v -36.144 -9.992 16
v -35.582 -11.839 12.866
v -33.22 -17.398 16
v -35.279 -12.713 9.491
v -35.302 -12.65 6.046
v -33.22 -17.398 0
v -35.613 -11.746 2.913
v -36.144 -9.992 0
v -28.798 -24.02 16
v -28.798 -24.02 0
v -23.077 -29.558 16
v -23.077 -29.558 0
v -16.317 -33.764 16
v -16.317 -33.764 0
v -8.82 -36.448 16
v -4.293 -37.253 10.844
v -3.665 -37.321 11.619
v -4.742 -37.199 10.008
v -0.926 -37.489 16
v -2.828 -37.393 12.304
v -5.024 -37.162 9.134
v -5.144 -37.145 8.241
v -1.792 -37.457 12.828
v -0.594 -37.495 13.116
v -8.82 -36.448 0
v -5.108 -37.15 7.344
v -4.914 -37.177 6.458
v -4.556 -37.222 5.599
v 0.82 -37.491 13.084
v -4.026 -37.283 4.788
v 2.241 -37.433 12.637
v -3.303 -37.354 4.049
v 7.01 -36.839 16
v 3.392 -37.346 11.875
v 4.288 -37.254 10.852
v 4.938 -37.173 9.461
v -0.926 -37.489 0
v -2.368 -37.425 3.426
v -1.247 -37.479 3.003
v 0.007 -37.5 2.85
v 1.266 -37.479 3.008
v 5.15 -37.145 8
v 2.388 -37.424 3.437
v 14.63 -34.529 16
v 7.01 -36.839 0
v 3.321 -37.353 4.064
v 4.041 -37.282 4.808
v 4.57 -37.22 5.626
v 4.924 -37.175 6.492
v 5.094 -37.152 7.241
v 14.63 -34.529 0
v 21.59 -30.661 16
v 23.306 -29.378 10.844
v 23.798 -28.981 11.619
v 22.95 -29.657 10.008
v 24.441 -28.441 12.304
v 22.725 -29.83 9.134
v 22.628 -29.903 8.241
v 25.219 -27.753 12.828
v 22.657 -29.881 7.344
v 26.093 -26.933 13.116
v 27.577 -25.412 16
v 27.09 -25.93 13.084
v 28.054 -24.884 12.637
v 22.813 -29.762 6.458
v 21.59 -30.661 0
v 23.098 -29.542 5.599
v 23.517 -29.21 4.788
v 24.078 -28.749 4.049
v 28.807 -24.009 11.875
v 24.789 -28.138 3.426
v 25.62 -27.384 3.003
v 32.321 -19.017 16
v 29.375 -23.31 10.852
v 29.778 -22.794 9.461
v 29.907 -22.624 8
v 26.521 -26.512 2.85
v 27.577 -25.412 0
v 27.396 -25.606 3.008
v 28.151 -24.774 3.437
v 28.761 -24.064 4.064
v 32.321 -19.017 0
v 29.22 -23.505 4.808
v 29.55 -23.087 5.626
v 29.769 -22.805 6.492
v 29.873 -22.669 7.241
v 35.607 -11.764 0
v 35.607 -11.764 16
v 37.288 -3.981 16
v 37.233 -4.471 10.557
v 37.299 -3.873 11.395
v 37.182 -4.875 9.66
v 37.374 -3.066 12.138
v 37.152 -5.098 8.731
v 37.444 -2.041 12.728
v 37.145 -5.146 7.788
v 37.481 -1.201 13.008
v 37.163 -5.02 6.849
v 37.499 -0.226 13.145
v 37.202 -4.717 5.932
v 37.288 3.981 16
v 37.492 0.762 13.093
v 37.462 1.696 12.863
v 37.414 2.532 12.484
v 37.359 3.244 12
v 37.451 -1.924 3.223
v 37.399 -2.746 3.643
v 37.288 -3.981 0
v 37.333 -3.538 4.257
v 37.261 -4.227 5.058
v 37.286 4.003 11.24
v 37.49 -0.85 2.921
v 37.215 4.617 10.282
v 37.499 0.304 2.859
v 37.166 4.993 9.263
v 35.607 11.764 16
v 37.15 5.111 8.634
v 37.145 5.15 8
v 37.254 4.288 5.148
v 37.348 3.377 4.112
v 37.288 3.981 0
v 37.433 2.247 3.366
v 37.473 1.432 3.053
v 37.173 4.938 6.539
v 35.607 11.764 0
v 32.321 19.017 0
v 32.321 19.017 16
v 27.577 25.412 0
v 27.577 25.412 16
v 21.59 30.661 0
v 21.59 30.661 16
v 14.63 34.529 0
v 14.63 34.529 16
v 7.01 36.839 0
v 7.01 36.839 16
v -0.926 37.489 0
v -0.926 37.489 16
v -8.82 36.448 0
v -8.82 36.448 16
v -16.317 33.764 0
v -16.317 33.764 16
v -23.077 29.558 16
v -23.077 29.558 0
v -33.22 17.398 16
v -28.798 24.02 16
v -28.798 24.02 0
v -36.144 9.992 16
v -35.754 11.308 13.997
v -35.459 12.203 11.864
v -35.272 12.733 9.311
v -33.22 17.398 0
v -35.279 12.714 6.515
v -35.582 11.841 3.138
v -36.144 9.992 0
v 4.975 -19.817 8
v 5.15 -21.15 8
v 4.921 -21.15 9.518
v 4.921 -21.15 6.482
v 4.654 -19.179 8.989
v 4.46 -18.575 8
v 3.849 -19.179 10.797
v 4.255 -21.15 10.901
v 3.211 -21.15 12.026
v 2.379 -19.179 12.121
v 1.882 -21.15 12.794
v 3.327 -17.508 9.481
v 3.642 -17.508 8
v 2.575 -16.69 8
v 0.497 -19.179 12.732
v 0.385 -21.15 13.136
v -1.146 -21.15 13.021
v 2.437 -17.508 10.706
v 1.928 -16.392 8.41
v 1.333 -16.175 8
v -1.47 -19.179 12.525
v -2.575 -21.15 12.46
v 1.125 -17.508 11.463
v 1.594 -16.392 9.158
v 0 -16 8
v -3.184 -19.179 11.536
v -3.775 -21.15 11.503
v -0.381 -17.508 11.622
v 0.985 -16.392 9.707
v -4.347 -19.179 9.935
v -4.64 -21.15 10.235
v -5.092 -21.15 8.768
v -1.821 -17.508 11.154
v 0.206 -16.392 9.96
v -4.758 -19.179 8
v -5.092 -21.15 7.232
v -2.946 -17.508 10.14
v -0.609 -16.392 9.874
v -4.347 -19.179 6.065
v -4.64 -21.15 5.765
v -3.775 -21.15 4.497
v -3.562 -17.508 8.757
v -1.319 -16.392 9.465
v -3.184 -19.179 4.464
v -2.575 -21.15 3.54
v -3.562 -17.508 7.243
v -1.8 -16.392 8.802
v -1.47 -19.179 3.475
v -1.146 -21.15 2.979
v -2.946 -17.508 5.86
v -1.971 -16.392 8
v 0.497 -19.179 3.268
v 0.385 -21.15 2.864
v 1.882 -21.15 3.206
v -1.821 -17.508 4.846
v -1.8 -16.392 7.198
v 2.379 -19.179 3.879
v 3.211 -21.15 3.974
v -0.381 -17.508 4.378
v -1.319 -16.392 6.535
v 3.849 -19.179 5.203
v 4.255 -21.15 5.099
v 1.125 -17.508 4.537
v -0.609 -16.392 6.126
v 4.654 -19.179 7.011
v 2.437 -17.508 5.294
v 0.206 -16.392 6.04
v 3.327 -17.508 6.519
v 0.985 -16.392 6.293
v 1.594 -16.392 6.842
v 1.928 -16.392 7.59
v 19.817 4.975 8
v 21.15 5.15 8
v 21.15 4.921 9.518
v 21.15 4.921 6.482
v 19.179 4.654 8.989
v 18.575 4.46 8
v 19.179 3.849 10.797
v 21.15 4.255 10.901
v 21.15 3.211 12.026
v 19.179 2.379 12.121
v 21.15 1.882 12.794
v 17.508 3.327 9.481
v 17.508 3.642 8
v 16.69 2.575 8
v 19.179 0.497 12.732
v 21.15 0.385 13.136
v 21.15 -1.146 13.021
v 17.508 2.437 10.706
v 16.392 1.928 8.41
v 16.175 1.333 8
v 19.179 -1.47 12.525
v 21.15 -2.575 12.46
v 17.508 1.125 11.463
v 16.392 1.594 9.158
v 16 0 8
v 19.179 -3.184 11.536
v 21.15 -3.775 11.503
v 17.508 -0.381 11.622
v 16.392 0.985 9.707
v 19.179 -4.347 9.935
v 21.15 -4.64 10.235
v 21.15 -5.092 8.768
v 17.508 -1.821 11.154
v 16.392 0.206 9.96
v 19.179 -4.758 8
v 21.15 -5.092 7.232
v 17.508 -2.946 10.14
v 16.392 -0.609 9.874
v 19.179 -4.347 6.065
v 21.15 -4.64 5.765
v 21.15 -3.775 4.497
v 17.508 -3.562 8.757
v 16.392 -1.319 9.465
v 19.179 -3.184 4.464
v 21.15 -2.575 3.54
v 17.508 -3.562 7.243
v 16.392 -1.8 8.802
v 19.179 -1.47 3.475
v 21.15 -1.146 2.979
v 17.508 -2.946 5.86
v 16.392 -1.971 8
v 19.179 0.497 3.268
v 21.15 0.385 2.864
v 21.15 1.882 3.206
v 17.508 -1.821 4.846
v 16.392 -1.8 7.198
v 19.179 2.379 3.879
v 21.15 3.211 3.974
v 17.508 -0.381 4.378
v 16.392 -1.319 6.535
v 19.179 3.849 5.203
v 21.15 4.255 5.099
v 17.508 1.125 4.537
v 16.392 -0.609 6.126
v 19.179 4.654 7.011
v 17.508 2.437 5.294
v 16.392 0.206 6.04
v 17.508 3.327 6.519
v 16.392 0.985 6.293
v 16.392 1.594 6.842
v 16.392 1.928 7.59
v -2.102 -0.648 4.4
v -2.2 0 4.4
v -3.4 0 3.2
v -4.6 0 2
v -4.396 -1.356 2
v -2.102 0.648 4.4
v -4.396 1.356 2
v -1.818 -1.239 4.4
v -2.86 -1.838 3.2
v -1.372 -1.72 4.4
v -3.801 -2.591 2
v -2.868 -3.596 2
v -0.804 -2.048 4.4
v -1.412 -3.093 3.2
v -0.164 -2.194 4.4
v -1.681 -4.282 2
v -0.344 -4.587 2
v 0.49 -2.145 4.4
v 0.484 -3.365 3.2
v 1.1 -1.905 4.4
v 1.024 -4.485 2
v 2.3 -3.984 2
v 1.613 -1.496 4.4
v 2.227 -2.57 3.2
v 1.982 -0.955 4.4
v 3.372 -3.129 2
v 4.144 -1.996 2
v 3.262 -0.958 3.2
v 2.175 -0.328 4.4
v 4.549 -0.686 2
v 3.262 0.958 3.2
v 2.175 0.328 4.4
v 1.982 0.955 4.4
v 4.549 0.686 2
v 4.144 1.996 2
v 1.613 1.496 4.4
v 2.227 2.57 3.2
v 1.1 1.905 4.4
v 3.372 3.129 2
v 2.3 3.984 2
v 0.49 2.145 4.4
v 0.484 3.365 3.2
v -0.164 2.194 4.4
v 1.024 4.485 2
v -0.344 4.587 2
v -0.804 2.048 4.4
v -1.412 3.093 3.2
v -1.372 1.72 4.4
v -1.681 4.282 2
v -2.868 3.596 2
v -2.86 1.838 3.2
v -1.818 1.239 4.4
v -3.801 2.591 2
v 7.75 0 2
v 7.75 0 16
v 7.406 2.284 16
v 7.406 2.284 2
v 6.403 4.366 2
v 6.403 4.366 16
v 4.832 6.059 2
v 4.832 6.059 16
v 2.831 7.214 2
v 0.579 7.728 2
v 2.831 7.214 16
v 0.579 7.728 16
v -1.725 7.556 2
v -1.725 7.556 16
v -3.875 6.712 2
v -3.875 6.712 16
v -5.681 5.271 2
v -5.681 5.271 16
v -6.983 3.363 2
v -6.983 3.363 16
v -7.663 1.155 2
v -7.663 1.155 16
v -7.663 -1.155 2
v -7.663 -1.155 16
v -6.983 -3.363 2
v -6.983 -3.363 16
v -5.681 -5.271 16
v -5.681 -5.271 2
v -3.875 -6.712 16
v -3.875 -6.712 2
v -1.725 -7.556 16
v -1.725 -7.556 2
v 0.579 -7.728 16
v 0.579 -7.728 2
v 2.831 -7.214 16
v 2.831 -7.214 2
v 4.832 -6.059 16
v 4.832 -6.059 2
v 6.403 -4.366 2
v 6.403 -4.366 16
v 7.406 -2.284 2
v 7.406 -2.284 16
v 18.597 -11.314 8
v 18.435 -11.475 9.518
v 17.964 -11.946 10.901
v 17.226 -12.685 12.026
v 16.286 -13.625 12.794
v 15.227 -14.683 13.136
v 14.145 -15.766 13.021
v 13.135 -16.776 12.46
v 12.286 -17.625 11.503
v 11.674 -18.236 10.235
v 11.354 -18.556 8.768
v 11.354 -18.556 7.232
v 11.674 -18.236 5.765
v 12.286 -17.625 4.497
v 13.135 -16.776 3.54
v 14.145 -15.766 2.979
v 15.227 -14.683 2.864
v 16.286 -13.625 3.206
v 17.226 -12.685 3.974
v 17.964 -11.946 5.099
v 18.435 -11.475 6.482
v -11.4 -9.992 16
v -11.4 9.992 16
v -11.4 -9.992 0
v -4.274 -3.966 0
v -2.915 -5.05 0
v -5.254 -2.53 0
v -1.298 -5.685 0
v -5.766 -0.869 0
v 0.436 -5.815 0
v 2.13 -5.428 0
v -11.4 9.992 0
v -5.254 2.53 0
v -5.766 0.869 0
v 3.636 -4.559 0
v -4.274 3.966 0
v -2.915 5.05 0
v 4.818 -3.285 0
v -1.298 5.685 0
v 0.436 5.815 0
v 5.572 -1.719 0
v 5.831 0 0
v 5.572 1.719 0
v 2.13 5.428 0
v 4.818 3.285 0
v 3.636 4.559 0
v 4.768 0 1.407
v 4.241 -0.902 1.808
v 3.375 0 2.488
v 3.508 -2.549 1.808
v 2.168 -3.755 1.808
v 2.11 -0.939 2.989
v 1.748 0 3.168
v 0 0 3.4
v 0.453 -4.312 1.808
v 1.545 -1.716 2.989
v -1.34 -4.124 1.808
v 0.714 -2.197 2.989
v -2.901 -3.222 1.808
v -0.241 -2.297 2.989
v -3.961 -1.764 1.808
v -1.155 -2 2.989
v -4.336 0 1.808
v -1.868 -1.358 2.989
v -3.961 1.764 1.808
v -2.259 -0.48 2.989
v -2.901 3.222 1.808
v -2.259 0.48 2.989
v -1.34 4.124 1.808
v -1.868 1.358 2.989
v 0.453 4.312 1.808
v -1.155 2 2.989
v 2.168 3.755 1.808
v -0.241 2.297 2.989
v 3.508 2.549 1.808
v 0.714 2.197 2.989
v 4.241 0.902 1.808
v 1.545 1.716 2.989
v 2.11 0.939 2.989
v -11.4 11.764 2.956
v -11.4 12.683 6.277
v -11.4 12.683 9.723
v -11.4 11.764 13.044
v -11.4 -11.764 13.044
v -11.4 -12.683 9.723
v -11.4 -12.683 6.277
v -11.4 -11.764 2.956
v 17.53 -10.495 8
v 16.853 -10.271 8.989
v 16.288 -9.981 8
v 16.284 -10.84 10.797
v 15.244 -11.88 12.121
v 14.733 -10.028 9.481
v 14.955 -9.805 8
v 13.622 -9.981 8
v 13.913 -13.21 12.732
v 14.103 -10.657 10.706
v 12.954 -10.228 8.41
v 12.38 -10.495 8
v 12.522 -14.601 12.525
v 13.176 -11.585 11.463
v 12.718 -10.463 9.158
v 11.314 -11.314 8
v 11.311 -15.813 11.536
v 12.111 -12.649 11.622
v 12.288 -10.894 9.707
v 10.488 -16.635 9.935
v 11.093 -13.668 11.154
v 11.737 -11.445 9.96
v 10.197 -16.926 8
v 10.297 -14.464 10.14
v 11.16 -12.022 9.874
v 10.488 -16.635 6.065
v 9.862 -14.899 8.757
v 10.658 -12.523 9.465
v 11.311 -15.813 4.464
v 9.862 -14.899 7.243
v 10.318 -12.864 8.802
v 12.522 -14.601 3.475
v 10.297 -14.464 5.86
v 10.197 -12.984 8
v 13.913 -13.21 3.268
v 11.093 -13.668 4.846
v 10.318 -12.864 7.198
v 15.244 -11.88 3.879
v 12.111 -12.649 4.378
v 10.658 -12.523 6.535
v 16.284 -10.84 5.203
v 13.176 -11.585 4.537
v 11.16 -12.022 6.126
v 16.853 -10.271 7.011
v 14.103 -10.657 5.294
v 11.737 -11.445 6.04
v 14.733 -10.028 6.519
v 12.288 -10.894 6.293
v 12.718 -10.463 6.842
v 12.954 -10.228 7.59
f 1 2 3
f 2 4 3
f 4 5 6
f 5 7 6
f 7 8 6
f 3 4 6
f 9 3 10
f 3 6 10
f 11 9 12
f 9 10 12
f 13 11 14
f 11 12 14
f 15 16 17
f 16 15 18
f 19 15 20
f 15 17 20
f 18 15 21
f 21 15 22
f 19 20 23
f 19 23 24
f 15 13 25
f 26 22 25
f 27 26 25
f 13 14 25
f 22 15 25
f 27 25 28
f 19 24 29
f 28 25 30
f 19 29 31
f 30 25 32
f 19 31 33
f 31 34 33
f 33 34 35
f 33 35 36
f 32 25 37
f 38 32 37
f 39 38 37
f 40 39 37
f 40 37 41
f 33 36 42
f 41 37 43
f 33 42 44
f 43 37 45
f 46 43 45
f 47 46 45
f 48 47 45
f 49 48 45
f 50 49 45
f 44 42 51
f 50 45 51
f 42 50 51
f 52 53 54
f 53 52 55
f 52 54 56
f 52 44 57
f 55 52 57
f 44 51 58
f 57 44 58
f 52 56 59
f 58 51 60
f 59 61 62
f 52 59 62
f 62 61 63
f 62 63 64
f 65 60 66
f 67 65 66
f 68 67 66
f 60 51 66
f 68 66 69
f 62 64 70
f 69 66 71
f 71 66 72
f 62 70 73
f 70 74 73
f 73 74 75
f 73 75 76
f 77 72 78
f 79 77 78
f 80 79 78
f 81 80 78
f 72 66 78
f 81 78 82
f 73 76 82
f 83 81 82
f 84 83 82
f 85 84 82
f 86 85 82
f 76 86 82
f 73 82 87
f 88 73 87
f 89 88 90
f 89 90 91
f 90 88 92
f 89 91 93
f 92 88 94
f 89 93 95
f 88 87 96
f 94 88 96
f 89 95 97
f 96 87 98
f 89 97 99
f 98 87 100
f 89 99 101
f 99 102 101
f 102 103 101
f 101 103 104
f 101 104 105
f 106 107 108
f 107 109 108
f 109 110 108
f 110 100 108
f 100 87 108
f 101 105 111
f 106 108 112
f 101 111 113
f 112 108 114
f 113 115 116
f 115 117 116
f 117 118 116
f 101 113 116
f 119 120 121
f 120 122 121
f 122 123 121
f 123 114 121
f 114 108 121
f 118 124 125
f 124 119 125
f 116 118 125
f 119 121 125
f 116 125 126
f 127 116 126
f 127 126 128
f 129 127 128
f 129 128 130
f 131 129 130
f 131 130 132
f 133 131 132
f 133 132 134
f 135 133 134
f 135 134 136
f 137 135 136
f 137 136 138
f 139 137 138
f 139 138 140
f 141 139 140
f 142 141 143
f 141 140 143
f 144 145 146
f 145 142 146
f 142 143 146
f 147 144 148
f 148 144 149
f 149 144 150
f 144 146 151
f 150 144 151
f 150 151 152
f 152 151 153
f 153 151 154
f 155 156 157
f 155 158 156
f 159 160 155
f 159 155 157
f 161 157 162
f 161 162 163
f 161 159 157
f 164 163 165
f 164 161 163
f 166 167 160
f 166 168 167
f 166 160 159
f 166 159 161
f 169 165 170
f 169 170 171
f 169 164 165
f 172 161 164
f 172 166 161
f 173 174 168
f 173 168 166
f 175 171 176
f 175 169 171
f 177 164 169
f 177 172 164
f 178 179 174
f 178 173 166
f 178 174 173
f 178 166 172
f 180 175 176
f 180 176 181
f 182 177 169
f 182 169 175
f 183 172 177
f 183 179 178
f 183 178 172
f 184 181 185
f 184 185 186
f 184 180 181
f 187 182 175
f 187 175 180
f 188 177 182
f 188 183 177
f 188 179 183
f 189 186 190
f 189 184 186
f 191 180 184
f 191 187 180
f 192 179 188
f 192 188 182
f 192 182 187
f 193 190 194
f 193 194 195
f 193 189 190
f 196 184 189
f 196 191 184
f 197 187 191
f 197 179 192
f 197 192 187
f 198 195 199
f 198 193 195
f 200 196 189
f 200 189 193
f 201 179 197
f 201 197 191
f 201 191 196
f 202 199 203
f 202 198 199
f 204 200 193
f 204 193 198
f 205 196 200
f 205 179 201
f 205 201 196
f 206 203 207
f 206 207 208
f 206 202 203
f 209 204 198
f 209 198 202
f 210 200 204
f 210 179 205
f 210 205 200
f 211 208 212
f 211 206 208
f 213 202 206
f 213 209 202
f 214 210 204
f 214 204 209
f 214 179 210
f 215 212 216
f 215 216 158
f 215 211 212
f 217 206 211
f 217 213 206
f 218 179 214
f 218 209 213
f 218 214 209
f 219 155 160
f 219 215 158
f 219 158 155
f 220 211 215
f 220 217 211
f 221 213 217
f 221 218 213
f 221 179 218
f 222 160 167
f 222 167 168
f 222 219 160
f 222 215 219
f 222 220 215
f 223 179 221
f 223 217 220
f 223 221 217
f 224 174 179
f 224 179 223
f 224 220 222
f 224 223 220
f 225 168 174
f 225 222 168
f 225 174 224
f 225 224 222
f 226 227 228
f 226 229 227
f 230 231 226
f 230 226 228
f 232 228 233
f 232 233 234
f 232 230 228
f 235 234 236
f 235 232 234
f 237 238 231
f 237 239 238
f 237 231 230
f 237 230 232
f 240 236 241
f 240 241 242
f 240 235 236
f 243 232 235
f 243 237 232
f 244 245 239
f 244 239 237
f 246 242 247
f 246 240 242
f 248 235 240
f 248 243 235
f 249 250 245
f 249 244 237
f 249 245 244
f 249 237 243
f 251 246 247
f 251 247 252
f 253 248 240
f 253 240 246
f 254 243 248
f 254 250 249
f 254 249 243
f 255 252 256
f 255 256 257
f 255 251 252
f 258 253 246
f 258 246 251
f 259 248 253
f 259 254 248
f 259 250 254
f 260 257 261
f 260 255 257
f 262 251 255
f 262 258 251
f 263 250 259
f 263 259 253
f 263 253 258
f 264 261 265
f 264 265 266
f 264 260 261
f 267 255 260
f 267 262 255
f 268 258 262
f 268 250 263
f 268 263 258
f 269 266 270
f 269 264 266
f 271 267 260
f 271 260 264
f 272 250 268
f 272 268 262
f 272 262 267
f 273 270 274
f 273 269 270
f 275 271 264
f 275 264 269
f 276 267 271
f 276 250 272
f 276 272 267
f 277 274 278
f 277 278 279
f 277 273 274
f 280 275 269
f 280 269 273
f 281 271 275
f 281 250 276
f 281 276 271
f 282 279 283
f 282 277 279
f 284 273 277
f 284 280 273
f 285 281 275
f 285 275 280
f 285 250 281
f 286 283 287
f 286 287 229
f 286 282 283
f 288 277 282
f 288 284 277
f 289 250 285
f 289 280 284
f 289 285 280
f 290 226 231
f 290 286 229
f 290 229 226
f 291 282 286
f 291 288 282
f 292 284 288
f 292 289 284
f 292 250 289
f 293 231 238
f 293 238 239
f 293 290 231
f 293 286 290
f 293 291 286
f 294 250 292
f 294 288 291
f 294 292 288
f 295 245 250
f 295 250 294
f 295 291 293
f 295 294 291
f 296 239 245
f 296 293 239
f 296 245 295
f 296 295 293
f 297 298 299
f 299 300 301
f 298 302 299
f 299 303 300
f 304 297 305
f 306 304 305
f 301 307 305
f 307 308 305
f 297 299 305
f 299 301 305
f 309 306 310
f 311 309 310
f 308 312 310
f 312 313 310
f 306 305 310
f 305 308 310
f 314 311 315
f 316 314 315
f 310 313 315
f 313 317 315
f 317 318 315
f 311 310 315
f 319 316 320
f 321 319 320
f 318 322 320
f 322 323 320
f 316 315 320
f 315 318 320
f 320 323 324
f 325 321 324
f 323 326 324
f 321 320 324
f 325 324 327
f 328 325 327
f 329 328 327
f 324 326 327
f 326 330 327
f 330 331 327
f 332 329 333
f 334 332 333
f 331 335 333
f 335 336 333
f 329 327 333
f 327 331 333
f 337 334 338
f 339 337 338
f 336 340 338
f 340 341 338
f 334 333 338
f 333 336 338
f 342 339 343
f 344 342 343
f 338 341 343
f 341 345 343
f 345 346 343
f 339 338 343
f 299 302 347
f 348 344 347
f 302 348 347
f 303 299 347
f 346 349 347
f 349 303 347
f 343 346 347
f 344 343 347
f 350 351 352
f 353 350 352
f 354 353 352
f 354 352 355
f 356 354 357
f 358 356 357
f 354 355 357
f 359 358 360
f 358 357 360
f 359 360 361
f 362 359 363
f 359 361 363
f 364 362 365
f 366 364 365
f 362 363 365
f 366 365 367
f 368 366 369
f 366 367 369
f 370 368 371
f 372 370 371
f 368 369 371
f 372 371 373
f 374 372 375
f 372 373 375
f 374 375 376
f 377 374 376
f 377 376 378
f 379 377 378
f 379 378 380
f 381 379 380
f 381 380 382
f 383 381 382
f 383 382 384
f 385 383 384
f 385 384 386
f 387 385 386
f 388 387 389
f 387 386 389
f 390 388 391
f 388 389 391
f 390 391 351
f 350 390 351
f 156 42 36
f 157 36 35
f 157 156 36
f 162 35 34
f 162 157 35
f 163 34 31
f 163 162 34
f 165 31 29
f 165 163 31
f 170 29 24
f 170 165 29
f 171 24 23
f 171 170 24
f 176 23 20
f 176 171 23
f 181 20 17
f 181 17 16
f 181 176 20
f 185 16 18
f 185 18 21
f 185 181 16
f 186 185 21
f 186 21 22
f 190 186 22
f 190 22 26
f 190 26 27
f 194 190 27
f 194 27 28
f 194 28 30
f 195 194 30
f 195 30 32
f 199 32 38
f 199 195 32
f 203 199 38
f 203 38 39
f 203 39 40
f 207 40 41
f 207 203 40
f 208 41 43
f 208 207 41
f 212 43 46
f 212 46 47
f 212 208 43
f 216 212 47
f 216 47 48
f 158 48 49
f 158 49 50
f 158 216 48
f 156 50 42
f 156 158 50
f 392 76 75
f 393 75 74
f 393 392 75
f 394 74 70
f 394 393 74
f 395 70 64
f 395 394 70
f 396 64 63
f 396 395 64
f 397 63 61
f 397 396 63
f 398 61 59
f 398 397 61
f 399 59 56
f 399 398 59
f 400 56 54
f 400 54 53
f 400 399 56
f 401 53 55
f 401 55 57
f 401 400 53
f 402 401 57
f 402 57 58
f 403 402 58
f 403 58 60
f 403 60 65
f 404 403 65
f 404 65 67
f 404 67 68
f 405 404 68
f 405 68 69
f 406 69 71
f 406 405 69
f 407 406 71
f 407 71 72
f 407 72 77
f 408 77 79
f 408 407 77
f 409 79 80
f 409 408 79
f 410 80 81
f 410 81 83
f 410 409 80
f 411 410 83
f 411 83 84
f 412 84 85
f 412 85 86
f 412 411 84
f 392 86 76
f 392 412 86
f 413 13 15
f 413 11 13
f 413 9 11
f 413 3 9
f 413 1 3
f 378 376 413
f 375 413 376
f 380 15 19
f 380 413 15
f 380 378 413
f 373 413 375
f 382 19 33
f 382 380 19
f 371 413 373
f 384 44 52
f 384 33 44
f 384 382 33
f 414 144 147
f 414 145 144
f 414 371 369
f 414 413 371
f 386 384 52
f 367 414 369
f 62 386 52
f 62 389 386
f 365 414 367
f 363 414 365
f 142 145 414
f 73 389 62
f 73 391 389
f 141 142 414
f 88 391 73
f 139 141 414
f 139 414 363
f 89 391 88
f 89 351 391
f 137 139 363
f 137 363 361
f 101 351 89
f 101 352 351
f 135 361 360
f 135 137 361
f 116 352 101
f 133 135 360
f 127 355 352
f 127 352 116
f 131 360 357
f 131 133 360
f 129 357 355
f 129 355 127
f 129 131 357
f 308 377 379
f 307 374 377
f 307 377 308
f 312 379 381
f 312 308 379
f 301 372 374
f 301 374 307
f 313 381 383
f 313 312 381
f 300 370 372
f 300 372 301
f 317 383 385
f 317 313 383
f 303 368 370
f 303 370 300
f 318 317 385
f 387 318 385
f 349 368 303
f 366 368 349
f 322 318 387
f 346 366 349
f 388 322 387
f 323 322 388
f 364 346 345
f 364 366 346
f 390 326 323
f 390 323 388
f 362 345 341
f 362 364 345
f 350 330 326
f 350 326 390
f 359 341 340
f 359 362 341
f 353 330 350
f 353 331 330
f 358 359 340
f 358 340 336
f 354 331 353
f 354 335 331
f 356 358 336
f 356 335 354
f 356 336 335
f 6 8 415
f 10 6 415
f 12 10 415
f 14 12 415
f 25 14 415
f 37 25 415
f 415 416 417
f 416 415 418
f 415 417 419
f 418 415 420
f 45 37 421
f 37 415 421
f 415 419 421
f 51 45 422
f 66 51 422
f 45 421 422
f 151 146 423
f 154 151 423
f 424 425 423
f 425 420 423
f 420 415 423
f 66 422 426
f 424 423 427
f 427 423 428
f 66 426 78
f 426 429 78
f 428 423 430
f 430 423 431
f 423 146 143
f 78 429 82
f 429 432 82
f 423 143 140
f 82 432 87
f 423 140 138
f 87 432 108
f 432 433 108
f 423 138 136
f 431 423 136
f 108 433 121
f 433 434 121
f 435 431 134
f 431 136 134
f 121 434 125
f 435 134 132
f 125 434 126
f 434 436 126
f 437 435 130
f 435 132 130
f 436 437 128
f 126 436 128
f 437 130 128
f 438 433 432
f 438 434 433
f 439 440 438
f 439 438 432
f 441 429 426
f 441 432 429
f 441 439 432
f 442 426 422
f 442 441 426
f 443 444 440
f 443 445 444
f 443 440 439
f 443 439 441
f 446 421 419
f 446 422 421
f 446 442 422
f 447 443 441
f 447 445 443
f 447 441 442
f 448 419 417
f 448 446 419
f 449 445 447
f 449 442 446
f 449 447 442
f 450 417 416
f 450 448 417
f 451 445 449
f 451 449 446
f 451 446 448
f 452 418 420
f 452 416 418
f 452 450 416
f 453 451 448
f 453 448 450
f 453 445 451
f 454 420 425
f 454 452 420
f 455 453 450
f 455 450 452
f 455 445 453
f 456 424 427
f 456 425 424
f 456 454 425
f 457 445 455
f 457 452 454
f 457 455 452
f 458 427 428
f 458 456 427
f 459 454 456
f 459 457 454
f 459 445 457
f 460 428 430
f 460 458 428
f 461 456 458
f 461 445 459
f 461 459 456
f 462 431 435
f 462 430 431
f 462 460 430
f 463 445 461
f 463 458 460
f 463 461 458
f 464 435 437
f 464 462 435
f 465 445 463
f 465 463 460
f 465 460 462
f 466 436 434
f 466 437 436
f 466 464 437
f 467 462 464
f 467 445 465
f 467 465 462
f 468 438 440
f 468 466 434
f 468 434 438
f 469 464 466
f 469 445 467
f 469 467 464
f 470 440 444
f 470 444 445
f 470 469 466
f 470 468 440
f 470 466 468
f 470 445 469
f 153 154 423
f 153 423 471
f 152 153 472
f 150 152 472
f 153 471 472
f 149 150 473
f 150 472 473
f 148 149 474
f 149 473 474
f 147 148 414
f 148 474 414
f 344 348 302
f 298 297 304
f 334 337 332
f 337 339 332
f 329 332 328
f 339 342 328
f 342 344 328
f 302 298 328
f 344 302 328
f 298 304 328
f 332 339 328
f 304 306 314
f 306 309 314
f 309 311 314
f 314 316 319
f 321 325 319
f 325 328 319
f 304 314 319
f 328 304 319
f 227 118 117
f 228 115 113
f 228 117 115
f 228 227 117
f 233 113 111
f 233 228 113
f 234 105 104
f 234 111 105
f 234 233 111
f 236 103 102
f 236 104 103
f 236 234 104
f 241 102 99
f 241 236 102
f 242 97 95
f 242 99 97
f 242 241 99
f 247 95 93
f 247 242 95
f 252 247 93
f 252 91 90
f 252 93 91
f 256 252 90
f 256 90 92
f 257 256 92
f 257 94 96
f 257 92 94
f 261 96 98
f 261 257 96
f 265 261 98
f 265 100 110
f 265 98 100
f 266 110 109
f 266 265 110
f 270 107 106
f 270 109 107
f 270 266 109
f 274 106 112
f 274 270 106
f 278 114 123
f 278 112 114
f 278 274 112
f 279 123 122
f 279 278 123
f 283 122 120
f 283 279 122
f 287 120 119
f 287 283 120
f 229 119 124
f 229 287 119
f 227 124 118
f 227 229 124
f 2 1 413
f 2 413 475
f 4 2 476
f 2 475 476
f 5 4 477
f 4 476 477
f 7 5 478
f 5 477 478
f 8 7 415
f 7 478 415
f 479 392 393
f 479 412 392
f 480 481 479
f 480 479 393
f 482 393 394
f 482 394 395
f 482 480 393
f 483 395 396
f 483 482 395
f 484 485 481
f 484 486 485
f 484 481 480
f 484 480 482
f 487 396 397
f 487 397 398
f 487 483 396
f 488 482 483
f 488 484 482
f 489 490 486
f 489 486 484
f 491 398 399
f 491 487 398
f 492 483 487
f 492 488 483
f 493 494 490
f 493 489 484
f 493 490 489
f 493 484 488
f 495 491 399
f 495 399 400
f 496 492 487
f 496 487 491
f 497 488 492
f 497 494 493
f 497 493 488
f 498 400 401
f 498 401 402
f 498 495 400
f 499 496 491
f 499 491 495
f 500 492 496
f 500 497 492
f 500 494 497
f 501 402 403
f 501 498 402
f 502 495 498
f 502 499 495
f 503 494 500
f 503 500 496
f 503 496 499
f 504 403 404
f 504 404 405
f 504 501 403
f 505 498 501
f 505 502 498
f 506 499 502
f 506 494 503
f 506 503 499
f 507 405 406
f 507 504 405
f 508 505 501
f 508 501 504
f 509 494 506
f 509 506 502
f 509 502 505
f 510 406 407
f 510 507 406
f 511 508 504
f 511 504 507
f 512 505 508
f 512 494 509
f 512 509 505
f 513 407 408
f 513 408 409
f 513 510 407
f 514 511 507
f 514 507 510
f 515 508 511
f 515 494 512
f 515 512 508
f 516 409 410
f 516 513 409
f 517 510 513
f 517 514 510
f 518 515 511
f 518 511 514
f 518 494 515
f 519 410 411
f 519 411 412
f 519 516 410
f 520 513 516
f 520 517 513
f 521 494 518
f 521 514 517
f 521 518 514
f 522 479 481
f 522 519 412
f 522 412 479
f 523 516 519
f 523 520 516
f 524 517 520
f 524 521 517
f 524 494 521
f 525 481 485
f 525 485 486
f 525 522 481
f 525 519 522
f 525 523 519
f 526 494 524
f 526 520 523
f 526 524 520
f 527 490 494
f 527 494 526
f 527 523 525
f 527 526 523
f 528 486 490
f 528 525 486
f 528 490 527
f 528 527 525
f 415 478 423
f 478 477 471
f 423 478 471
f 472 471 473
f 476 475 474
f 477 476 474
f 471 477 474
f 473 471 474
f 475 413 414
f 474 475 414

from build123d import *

# Parameters (mm, degrees)
F0_R             = 37.5
F1_DEPTH         = 16
F3_START         = -11.4
F2_R             = 12.8
F3_DEPTH         = 28.6
F4_R             = 7.75
F5_DEPTH         = 14
F12_COPIES_COUNT = 3
F12_COPIES_ANGLE = 90


# Not quite as in the source:
# - a pattern or mirror of a feature is missing from the dataset's text; its kind, count and spacing are read off the source's solid


with BuildPart() as f1:
    # F0 (on Top) → F1 (new body)
    with BuildSketch(Plane.XY):
        Circle(F0_R)
    extrude(amount=F1_DEPTH)

    # F2 (on Right) → F3 (cut)
    with BuildSketch(Plane.YZ.offset(F3_START)):
        with Locations((0, 8)):
            Circle(F2_R)
    extrude(amount=-F3_DEPTH, mode=Mode.SUBTRACT)

    # F4 (on face) → F5 (cut)
    with BuildSketch(Plane.XY.offset(16)):
        Circle(F4_R)
    extrude(amount=-F5_DEPTH, mode=Mode.SUBTRACT)

    # F7 (on Front) → F8 (revolve)
    with BuildSketch(Plane.XZ):
        Polygon((0, 2), (0, 4.4), (-2.2, 4.4), (-4.6, 2), align=None)
    revolve(axis=Axis((0, 0, 3.2), (0, 0, 1)))

    # F9 (on Front) → F10 (revolve, cut)
    with BuildSketch(Plane.XZ):
        with BuildLine():
            ThreePointArc((0, -10), (4.7376154339, -8.0376154339), (6.7, -3.3))
            ThreePointArc((6.7, -3.3), (4.7376154339, 1.4376154339), (0, 3.4))
            Line((0, 3.4), (0, -10))
        make_face()
    revolve(axis=Axis((0, 0, -3.3), (0, 0, -1)), mode=Mode.SUBTRACT)

    # F11 (on offset) → F12 (revolve, cut)
    with BuildSketch(Plane.XY.offset(8)):
        with BuildLine():
            Line((16, 0), (52, 0))
            Line((52, 0), (52, 5.15))
            Line((52, 5.15), (21.15, 5.15))
            ThreePointArc((21.15, 5.15), (17.5084000769, 3.6415999231), (16, 0))
        make_face()
    f12 = revolve(axis=Axis((34, 0, 8), (1, 0, 0)), mode=Mode.SUBTRACT)

    # F12_copies: F12 ×3 about axis
    f12_copies_axis = Axis((0, 0, 0), (0, 0, -1))
    for i in range(1, F12_COPIES_COUNT):
        add(f12.rotate(f12_copies_axis, i * F12_COPIES_ANGLE / (F12_COPIES_COUNT - 1)), mode=Mode.SUBTRACT)


solid = f1.part
